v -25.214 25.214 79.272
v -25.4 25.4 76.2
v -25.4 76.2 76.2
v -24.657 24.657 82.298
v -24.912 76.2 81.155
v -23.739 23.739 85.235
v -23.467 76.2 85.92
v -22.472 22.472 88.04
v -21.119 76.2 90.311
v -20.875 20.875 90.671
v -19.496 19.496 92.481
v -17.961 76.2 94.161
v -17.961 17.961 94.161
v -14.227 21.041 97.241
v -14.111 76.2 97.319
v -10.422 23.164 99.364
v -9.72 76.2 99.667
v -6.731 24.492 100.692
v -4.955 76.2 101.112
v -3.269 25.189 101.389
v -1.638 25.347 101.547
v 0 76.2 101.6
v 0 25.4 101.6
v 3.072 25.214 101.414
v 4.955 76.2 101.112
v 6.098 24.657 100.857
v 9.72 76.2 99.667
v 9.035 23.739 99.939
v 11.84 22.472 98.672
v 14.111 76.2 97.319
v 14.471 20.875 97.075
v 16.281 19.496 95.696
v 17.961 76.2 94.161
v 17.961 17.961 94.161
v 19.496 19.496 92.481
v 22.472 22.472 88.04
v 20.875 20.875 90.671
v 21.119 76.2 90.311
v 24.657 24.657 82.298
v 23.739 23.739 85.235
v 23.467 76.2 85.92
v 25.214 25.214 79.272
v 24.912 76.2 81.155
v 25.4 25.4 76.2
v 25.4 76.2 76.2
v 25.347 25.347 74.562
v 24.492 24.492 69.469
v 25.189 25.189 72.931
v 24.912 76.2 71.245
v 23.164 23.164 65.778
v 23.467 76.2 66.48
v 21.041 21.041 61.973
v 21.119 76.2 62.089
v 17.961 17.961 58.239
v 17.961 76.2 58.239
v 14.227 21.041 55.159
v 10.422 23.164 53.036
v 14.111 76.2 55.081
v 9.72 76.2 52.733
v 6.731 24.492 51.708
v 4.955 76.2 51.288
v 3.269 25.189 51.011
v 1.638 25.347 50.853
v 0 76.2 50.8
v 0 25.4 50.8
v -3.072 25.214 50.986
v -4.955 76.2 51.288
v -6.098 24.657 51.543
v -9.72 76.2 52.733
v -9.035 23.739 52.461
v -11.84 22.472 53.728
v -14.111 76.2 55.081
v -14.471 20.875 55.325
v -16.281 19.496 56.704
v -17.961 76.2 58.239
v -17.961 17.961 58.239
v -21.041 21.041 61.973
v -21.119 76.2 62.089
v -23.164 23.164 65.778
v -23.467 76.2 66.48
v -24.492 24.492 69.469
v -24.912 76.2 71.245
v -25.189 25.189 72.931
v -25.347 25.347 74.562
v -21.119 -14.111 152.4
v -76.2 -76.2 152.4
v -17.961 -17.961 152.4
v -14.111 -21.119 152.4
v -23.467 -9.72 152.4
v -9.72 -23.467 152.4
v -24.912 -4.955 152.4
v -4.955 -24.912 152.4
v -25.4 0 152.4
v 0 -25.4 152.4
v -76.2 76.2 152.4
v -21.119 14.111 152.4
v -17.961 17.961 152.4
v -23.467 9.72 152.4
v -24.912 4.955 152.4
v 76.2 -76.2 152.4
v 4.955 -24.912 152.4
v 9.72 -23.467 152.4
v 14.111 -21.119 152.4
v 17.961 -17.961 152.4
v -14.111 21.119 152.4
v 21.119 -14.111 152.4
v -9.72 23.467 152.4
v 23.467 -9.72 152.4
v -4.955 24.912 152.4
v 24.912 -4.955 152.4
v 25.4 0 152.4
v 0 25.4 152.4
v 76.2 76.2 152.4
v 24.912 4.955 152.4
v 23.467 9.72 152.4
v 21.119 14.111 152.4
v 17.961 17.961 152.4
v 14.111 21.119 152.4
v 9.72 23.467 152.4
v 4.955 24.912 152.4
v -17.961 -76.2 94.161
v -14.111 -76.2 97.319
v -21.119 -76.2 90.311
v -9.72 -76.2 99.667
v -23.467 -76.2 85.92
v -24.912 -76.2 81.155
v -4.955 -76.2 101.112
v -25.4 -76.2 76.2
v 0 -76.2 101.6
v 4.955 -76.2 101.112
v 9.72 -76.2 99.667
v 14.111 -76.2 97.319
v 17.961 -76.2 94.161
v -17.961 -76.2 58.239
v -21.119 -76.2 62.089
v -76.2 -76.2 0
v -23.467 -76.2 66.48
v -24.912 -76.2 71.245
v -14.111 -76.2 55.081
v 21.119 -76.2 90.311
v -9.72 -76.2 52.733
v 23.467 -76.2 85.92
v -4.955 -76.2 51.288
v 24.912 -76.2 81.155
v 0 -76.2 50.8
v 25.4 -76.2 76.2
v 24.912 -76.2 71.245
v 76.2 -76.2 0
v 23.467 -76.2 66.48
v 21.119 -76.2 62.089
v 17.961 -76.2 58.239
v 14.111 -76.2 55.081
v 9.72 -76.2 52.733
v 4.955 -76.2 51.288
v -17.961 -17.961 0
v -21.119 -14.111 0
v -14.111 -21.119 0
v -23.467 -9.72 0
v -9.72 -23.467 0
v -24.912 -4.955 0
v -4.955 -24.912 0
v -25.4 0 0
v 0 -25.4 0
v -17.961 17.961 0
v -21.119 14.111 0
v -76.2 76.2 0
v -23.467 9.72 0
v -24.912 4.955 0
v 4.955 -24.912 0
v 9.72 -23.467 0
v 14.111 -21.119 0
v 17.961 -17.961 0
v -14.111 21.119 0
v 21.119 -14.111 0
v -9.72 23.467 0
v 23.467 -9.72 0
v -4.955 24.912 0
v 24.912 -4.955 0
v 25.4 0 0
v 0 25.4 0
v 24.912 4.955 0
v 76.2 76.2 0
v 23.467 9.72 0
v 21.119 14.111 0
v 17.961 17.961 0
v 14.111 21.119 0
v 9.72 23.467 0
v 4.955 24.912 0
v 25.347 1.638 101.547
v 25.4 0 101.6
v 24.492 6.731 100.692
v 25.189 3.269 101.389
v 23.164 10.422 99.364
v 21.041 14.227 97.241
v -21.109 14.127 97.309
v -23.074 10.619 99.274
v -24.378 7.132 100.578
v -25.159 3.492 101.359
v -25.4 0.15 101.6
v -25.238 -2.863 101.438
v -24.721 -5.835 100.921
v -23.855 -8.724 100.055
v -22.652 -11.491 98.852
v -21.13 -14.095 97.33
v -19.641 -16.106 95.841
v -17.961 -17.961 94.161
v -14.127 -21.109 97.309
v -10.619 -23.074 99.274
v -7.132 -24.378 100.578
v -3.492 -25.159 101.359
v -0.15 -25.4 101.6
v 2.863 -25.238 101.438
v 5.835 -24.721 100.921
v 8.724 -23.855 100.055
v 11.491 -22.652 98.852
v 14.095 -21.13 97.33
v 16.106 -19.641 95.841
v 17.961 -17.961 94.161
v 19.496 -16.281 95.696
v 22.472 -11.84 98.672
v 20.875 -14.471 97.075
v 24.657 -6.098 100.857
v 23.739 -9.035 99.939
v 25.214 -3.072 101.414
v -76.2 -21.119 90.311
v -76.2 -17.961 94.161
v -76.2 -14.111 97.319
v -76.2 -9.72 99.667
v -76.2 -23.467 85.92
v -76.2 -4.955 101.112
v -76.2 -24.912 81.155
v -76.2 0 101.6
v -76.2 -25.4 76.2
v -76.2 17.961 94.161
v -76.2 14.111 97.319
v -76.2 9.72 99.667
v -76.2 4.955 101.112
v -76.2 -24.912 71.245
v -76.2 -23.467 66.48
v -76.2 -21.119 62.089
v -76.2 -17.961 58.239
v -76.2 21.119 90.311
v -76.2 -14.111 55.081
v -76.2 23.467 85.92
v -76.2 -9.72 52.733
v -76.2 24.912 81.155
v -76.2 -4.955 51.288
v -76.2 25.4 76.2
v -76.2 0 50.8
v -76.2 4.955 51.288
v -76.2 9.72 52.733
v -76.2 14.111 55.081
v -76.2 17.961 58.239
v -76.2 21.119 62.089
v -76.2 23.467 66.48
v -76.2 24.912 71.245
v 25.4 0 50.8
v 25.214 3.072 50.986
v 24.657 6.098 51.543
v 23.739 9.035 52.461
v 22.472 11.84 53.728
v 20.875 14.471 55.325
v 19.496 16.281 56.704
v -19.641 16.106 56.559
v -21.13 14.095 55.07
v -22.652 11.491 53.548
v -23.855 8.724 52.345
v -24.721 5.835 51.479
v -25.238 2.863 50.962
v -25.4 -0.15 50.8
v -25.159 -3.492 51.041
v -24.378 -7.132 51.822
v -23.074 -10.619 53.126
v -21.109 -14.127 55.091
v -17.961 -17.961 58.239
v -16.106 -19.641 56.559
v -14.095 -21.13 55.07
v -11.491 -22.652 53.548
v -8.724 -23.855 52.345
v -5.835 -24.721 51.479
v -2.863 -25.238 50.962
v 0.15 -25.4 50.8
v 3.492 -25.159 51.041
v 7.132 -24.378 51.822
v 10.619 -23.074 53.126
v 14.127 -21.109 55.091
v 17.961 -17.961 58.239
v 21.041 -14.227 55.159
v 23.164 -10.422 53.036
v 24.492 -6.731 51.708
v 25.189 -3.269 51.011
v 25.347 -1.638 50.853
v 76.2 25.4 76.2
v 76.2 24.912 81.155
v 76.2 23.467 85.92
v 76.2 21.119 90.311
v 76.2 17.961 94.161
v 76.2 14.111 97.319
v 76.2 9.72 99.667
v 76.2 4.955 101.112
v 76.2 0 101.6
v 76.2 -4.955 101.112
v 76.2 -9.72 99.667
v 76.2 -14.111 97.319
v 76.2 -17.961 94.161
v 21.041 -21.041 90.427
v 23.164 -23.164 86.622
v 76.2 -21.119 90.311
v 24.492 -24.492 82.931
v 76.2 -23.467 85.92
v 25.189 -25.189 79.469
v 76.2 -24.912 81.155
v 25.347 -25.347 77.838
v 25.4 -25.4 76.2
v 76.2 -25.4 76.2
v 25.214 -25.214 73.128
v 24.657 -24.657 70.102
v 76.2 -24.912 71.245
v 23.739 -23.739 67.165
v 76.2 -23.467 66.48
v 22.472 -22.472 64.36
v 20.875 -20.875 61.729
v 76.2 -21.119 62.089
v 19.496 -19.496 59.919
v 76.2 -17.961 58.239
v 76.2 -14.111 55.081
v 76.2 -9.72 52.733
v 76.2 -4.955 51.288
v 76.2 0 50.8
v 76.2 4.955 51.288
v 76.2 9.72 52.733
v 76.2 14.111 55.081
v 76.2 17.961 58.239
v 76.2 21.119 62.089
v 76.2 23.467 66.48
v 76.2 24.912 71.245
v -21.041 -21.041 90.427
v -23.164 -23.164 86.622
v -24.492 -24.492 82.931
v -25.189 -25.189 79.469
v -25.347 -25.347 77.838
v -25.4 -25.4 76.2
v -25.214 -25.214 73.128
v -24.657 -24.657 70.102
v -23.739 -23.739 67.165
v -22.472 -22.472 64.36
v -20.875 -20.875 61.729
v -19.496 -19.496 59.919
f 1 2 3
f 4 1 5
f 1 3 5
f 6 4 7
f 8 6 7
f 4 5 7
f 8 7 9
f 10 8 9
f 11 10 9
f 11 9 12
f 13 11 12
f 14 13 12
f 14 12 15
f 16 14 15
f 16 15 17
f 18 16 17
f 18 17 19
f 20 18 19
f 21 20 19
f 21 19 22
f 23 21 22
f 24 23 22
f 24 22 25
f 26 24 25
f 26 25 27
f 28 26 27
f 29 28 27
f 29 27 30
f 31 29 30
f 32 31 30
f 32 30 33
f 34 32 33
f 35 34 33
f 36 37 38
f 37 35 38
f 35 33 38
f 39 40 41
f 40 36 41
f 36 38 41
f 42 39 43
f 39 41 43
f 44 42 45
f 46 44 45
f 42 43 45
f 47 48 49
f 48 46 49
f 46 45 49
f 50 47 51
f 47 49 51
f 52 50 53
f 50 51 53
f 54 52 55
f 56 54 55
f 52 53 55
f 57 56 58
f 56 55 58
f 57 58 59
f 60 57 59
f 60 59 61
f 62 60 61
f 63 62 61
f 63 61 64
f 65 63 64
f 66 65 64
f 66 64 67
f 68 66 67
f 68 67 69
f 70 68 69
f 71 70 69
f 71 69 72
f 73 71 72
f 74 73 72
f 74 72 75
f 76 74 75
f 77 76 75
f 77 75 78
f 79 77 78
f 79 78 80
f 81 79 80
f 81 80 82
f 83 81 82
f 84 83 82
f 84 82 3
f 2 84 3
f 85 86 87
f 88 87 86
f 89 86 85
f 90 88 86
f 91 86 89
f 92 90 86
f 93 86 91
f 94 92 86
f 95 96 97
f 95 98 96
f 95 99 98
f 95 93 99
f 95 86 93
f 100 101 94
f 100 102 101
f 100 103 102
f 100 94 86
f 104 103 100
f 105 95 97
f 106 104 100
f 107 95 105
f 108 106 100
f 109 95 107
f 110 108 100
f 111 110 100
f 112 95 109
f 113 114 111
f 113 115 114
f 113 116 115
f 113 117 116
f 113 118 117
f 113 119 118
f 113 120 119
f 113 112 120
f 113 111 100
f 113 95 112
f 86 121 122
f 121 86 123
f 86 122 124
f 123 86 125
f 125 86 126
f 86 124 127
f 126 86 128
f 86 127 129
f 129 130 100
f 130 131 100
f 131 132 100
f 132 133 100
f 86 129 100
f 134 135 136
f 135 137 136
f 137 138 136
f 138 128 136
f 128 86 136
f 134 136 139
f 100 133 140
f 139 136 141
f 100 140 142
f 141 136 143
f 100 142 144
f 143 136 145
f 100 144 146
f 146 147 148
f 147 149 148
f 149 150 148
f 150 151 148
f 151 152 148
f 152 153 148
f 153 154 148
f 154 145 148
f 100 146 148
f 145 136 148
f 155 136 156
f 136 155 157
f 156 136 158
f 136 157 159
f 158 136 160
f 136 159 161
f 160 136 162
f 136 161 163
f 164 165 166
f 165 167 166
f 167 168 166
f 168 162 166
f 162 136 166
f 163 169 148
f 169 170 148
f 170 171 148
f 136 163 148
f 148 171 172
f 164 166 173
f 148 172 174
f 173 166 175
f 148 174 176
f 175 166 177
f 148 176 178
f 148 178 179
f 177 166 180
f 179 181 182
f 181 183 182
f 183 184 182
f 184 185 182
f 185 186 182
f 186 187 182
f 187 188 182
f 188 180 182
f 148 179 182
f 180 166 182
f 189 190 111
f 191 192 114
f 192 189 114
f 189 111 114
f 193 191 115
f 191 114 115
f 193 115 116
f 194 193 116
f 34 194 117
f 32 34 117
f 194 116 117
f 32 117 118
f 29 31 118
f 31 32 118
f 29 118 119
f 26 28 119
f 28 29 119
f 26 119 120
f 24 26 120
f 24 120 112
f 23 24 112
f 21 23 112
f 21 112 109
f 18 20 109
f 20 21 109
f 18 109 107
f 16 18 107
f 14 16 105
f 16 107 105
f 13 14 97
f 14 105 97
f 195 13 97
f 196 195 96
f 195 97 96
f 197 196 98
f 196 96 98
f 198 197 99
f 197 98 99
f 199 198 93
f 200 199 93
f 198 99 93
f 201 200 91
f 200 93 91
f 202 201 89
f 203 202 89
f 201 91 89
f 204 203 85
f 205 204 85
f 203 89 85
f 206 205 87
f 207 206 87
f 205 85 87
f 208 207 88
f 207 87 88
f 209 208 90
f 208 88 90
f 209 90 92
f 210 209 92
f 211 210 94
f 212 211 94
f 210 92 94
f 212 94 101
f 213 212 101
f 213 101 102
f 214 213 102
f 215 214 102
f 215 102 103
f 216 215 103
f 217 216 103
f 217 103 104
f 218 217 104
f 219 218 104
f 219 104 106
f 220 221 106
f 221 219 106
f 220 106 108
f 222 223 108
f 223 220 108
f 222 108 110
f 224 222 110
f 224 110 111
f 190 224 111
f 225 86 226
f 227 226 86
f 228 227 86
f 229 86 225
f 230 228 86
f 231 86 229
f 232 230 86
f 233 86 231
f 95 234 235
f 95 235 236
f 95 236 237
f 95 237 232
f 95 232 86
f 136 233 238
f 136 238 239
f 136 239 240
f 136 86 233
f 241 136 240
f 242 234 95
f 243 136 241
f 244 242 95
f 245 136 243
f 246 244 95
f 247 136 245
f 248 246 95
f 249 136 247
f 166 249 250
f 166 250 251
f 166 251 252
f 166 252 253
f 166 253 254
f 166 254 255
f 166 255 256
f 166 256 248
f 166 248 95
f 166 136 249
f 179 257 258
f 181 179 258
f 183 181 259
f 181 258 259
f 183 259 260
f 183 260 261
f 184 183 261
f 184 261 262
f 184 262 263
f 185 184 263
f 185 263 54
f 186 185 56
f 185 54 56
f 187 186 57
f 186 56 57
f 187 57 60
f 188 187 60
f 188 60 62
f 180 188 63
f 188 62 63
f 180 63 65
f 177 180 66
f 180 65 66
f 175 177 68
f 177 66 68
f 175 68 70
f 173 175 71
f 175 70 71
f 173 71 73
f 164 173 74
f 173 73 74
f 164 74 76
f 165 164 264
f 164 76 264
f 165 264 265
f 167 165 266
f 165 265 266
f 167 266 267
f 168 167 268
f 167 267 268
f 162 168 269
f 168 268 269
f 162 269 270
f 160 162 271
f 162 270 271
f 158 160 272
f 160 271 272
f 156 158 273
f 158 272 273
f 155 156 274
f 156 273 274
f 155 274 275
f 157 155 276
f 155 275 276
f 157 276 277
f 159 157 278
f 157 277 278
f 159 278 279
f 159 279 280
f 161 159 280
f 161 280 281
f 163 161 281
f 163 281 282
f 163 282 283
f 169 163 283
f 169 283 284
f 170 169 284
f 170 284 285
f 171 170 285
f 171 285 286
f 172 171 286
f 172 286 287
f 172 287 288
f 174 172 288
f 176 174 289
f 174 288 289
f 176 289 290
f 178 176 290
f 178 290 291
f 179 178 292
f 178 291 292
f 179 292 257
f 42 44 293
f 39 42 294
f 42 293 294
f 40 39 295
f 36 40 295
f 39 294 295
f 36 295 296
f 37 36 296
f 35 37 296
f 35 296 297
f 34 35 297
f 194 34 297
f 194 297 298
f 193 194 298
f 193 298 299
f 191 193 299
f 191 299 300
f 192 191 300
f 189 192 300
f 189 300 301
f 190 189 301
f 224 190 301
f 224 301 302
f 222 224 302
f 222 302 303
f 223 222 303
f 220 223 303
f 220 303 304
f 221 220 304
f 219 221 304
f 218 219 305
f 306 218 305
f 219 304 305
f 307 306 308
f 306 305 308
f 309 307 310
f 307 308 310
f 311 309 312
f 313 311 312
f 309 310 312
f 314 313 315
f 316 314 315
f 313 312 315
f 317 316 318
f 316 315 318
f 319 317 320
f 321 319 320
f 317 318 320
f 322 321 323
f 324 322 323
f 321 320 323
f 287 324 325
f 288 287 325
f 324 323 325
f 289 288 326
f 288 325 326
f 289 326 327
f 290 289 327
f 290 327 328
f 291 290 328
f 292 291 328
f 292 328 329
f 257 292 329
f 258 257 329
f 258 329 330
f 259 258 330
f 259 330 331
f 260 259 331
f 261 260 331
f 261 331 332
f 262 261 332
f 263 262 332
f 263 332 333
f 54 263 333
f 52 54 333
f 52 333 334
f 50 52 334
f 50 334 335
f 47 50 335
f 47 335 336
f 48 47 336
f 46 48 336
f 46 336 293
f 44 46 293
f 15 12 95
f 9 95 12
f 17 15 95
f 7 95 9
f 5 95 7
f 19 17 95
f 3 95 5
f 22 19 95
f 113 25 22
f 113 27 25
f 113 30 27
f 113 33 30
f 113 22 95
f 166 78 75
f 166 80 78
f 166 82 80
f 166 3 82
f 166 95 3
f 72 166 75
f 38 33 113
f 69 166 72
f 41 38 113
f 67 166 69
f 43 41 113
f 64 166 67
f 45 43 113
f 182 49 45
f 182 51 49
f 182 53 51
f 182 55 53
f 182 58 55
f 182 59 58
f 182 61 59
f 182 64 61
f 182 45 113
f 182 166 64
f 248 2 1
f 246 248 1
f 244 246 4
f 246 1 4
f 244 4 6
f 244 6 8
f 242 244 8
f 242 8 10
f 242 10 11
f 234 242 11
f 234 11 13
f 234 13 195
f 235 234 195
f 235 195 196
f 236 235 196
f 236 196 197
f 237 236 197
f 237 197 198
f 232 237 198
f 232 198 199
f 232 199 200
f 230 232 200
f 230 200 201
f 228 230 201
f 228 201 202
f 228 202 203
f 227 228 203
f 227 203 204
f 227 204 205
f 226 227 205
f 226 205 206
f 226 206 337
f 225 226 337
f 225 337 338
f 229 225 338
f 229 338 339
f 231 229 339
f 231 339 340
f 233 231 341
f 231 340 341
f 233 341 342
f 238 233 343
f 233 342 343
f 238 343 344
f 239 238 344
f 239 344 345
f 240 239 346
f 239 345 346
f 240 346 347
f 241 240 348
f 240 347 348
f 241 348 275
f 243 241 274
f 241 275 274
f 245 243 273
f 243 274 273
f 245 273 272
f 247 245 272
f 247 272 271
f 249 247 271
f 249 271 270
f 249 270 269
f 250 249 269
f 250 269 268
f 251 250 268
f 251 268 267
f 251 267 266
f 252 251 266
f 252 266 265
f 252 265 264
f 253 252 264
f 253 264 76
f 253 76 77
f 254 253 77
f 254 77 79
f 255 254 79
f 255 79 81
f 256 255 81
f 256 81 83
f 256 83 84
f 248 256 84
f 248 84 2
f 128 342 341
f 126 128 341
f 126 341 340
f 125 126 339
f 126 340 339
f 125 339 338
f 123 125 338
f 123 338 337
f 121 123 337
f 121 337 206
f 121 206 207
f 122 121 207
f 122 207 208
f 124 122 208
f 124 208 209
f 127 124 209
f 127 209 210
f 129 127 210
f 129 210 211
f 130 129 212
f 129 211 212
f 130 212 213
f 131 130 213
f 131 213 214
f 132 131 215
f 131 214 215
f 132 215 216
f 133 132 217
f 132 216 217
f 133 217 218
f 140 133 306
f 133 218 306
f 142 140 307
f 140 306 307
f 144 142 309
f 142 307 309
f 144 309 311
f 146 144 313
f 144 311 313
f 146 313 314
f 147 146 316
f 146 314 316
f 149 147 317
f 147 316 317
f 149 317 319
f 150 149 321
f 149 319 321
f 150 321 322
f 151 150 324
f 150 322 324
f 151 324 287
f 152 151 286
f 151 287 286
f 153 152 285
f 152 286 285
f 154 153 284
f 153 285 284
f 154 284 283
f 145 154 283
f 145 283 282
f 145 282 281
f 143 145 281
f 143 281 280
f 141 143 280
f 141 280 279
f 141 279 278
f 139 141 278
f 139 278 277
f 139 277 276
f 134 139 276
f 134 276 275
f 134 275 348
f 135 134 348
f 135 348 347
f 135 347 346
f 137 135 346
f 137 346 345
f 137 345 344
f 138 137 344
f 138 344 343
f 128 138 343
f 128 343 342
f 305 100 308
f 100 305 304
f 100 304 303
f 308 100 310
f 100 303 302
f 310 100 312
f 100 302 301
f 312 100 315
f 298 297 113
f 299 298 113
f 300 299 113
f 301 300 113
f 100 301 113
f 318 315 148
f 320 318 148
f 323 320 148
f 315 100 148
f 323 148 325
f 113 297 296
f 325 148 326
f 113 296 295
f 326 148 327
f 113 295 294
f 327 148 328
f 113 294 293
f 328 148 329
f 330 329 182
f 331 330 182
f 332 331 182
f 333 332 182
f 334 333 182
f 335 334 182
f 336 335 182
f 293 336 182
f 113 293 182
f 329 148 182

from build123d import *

# Parameters (mm, degrees)
F0_W     = 152.4
F0_H     = 152.4
F1_DEPTH = 152.4
F2_R     = 25.4
F3_DEPTH = 152.401
F4_R     = 25.4
F5_DEPTH = 152.401
F6_R     = 25.4
F7_DEPTH = 152.401


with BuildPart() as f1:
    # F0 (on Top) → F1 (new body)
    with BuildSketch(Plane.XY):
        Rectangle(F0_W, F0_H)
    extrude(amount=F1_DEPTH)

    # F2 (on face) → F3 (cut, through all)
    with BuildSketch(Plane.YZ.offset(76.2)):
        with Locations((0, 76.2)):
            Circle(F2_R)
    extrude(amount=-F3_DEPTH, mode=Mode.SUBTRACT)

    # F4 (on face) → F5 (cut, through all)
    with BuildSketch(Plane(origin=(0, 76.2, 0), x_dir=(-1, 0, 0), z_dir=(0, 1, 0))):
        with Locations((0, 76.2)):
            Circle(F4_R)
    extrude(amount=-F5_DEPTH, mode=Mode.SUBTRACT)

    # F6 (on face) → F7 (cut, through all)
    with BuildSketch(Plane.XY.offset(152.4)):
        Circle(F6_R)
    extrude(amount=-F7_DEPTH, mode=Mode.SUBTRACT)


solid = f1.part
